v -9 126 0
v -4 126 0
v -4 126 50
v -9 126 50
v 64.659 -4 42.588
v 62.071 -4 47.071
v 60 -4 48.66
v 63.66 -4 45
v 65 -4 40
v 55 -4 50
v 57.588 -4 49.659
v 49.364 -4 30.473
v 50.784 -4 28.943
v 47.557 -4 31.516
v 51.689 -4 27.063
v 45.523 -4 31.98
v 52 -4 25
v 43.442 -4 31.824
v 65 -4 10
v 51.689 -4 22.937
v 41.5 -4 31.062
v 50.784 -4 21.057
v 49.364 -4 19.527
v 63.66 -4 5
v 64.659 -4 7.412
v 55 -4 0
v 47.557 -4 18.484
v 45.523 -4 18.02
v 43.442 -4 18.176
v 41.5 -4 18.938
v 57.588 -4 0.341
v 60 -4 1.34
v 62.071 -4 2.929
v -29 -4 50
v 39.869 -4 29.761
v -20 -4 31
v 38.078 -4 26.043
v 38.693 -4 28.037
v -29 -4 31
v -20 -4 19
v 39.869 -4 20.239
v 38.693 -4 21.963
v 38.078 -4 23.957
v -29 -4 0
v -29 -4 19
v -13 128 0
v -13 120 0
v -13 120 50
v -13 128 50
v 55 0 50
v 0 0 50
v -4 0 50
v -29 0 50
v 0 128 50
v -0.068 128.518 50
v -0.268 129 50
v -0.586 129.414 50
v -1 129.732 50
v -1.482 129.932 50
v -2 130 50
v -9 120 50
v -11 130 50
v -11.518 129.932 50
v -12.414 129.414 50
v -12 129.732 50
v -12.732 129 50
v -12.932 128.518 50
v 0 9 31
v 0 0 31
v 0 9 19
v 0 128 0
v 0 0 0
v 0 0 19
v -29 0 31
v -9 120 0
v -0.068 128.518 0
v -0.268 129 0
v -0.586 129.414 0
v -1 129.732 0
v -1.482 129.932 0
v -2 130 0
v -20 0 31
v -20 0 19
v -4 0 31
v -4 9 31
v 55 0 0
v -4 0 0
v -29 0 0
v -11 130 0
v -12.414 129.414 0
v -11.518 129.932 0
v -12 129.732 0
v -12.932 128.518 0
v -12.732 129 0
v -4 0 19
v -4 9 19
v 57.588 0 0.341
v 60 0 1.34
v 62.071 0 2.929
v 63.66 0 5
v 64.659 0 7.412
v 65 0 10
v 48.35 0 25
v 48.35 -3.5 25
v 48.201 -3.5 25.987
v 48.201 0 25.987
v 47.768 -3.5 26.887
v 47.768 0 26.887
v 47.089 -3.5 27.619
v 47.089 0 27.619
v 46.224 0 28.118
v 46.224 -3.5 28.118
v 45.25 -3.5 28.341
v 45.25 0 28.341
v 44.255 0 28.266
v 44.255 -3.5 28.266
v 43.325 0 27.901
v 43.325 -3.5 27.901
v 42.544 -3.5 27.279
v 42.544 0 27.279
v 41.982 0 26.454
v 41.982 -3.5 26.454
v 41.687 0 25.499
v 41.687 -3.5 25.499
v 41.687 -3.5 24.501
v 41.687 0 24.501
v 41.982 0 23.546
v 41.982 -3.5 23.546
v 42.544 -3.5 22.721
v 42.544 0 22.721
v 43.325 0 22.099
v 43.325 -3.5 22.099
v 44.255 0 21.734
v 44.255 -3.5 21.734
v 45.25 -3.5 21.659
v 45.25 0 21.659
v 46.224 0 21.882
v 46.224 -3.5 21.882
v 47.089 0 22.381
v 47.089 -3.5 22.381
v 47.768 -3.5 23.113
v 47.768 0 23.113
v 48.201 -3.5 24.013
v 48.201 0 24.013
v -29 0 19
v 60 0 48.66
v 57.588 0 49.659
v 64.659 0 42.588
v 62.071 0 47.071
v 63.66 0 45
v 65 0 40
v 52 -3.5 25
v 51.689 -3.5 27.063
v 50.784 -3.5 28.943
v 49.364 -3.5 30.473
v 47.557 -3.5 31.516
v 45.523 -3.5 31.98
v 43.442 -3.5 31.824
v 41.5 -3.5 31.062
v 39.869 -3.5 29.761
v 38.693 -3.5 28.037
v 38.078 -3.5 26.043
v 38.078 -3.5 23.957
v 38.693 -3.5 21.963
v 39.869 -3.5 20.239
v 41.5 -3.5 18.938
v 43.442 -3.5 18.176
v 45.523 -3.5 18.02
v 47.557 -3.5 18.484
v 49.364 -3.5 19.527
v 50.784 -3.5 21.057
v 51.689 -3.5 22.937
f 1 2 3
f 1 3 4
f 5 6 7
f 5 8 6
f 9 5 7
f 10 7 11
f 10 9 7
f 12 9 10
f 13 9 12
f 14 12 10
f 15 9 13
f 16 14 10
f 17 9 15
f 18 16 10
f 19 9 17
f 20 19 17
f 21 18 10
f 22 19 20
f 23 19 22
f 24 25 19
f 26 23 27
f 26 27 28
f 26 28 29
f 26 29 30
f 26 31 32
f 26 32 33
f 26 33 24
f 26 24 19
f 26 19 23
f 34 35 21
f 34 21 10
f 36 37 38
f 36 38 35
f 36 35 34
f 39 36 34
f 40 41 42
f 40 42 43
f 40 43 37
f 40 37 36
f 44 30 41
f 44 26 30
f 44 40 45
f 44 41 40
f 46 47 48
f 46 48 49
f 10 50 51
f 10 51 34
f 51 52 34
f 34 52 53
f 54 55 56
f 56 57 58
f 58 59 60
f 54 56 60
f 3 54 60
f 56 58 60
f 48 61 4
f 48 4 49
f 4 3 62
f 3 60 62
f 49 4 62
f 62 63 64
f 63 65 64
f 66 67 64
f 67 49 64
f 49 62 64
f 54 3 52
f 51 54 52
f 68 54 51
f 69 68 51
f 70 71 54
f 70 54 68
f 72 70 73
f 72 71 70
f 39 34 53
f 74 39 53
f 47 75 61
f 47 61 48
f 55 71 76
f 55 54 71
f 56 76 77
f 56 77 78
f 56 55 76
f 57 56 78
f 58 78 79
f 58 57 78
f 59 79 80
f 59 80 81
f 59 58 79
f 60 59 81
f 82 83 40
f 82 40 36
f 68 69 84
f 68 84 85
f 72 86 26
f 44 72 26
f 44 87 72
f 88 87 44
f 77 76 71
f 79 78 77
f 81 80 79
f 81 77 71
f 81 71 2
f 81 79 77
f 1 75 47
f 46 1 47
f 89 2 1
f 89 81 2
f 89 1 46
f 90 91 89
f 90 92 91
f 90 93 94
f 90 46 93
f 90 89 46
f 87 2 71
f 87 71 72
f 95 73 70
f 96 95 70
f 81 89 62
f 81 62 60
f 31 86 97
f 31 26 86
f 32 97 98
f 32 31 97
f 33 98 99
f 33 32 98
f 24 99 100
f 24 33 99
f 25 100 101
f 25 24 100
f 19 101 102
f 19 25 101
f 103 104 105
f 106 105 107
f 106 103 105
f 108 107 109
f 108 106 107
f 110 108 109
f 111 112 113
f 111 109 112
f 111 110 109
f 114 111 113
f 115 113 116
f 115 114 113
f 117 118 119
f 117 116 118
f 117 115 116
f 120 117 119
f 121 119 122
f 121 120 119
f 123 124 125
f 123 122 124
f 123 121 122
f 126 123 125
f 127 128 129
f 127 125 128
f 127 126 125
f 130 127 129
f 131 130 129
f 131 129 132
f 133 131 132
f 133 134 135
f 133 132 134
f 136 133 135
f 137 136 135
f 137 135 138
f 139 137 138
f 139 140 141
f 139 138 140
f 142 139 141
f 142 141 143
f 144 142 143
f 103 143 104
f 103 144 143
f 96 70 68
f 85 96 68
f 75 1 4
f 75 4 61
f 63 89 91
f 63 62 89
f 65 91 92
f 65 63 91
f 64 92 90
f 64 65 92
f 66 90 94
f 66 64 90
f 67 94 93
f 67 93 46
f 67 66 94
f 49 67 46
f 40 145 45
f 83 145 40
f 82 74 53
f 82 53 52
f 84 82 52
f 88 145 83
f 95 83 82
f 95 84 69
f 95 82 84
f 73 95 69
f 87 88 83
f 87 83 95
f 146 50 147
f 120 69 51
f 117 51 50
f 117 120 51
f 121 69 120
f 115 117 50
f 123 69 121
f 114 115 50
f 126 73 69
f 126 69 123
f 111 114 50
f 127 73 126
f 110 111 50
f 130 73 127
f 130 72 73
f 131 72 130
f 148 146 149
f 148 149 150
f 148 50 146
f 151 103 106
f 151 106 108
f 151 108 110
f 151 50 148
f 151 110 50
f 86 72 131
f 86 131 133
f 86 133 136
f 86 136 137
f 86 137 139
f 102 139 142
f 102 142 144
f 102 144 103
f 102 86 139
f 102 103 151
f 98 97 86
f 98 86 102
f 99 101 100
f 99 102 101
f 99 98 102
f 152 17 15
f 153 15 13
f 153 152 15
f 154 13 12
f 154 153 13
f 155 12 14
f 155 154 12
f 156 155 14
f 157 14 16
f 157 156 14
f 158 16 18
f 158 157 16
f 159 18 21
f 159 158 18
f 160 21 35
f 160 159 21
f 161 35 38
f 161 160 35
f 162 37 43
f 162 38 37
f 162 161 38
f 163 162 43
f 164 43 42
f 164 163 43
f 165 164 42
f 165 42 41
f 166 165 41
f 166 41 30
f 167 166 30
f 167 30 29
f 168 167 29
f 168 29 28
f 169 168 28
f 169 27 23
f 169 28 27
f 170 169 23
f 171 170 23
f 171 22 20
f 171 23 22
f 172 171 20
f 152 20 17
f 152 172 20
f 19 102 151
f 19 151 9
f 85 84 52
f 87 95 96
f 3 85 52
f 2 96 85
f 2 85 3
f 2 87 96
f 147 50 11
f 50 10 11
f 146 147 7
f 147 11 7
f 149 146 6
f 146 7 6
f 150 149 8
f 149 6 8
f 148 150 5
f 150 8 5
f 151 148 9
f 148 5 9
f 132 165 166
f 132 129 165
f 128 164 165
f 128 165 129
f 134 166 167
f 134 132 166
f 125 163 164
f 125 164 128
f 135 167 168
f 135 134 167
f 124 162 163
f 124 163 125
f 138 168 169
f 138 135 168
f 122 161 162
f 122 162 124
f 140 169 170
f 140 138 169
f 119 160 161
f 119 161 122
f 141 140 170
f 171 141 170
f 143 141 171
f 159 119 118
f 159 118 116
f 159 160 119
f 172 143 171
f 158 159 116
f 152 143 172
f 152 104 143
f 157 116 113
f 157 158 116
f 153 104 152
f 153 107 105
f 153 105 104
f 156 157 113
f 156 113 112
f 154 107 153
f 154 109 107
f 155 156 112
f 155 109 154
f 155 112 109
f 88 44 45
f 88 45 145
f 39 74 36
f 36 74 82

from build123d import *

# Parameters (mm, degrees)
PAD_DEPTH         = 50
SKETCH001_R       = 3.35
POCKET_DEPTH      = 130.001
POCKET_DEPTH_BACK = -4.001
SKETCH002_R       = 7
POCKET001_DEPTH   = 0.501
FILLET_R          = 10
FILLET001_R       = 2
SKETCH003_W       = 9
SKETCH003_H       = 12
POCKET002_DEPTH   = 29.001
SKETCH004_W       = 9
SKETCH004_H       = 12
POCKET003_DEPTH   = 4.001


with BuildPart() as part:
    # Sketch → Pad (new body)
    with BuildSketch(Plane.XY):
        Polygon((0, 130), (0, 0), (65, 0), (65, -4), (-29, -4), (-29, 0), (-4, 0), (-4, 126), (-9, 126), (-9, 120), (-13, 120), (-13, 130), align=None)
    extrude(amount=PAD_DEPTH)

    # Sketch001 → Pocket (cut, two sides)
    with BuildSketch(Plane.XZ) as pocket_sk:
        with Locations((45, 25)):
            Circle(SKETCH001_R)
    extrude(amount=-POCKET_DEPTH, mode=Mode.SUBTRACT)
    extrude(pocket_sk.sketch, amount=-POCKET_DEPTH_BACK, mode=Mode.SUBTRACT)

    # Sketch002 → Pocket001 (cut, through all)
    with BuildSketch(Plane.XZ.offset(3.5)):
        with Locations((45, 25)):
            Circle(SKETCH002_R)
    extrude(amount=POCKET001_DEPTH, mode=Mode.SUBTRACT)

    # Fillet
    fillet_edges = [part.edges().sort_by_distance(p)[0] for p in [
        (65, -2, 50),
        (65, -2, 0),
    ]]
    fillet(fillet_edges, radius=FILLET_R)

    # Fillet001
    fillet001_edges = [part.edges().sort_by_distance(p)[0] for p in [
        (-13, 130, 25),
        (0, 130, 25),
    ]]
    fillet(fillet001_edges, radius=FILLET001_R)

    # Sketch003 → Pocket002 (cut, through all)
    with BuildSketch(Plane.YZ):
        with Locations((4.5, 25)):
            Rectangle(SKETCH003_W, SKETCH003_H)
    extrude(amount=-POCKET002_DEPTH, mode=Mode.SUBTRACT)

    # Sketch004 → Pocket003 (cut, through all)
    with BuildSketch(Plane.XZ):
        with Locations((-24.5, 25)):
            Rectangle(SKETCH004_W, SKETCH004_H)
    extrude(amount=POCKET003_DEPTH, mode=Mode.SUBTRACT)


solid = part.part
